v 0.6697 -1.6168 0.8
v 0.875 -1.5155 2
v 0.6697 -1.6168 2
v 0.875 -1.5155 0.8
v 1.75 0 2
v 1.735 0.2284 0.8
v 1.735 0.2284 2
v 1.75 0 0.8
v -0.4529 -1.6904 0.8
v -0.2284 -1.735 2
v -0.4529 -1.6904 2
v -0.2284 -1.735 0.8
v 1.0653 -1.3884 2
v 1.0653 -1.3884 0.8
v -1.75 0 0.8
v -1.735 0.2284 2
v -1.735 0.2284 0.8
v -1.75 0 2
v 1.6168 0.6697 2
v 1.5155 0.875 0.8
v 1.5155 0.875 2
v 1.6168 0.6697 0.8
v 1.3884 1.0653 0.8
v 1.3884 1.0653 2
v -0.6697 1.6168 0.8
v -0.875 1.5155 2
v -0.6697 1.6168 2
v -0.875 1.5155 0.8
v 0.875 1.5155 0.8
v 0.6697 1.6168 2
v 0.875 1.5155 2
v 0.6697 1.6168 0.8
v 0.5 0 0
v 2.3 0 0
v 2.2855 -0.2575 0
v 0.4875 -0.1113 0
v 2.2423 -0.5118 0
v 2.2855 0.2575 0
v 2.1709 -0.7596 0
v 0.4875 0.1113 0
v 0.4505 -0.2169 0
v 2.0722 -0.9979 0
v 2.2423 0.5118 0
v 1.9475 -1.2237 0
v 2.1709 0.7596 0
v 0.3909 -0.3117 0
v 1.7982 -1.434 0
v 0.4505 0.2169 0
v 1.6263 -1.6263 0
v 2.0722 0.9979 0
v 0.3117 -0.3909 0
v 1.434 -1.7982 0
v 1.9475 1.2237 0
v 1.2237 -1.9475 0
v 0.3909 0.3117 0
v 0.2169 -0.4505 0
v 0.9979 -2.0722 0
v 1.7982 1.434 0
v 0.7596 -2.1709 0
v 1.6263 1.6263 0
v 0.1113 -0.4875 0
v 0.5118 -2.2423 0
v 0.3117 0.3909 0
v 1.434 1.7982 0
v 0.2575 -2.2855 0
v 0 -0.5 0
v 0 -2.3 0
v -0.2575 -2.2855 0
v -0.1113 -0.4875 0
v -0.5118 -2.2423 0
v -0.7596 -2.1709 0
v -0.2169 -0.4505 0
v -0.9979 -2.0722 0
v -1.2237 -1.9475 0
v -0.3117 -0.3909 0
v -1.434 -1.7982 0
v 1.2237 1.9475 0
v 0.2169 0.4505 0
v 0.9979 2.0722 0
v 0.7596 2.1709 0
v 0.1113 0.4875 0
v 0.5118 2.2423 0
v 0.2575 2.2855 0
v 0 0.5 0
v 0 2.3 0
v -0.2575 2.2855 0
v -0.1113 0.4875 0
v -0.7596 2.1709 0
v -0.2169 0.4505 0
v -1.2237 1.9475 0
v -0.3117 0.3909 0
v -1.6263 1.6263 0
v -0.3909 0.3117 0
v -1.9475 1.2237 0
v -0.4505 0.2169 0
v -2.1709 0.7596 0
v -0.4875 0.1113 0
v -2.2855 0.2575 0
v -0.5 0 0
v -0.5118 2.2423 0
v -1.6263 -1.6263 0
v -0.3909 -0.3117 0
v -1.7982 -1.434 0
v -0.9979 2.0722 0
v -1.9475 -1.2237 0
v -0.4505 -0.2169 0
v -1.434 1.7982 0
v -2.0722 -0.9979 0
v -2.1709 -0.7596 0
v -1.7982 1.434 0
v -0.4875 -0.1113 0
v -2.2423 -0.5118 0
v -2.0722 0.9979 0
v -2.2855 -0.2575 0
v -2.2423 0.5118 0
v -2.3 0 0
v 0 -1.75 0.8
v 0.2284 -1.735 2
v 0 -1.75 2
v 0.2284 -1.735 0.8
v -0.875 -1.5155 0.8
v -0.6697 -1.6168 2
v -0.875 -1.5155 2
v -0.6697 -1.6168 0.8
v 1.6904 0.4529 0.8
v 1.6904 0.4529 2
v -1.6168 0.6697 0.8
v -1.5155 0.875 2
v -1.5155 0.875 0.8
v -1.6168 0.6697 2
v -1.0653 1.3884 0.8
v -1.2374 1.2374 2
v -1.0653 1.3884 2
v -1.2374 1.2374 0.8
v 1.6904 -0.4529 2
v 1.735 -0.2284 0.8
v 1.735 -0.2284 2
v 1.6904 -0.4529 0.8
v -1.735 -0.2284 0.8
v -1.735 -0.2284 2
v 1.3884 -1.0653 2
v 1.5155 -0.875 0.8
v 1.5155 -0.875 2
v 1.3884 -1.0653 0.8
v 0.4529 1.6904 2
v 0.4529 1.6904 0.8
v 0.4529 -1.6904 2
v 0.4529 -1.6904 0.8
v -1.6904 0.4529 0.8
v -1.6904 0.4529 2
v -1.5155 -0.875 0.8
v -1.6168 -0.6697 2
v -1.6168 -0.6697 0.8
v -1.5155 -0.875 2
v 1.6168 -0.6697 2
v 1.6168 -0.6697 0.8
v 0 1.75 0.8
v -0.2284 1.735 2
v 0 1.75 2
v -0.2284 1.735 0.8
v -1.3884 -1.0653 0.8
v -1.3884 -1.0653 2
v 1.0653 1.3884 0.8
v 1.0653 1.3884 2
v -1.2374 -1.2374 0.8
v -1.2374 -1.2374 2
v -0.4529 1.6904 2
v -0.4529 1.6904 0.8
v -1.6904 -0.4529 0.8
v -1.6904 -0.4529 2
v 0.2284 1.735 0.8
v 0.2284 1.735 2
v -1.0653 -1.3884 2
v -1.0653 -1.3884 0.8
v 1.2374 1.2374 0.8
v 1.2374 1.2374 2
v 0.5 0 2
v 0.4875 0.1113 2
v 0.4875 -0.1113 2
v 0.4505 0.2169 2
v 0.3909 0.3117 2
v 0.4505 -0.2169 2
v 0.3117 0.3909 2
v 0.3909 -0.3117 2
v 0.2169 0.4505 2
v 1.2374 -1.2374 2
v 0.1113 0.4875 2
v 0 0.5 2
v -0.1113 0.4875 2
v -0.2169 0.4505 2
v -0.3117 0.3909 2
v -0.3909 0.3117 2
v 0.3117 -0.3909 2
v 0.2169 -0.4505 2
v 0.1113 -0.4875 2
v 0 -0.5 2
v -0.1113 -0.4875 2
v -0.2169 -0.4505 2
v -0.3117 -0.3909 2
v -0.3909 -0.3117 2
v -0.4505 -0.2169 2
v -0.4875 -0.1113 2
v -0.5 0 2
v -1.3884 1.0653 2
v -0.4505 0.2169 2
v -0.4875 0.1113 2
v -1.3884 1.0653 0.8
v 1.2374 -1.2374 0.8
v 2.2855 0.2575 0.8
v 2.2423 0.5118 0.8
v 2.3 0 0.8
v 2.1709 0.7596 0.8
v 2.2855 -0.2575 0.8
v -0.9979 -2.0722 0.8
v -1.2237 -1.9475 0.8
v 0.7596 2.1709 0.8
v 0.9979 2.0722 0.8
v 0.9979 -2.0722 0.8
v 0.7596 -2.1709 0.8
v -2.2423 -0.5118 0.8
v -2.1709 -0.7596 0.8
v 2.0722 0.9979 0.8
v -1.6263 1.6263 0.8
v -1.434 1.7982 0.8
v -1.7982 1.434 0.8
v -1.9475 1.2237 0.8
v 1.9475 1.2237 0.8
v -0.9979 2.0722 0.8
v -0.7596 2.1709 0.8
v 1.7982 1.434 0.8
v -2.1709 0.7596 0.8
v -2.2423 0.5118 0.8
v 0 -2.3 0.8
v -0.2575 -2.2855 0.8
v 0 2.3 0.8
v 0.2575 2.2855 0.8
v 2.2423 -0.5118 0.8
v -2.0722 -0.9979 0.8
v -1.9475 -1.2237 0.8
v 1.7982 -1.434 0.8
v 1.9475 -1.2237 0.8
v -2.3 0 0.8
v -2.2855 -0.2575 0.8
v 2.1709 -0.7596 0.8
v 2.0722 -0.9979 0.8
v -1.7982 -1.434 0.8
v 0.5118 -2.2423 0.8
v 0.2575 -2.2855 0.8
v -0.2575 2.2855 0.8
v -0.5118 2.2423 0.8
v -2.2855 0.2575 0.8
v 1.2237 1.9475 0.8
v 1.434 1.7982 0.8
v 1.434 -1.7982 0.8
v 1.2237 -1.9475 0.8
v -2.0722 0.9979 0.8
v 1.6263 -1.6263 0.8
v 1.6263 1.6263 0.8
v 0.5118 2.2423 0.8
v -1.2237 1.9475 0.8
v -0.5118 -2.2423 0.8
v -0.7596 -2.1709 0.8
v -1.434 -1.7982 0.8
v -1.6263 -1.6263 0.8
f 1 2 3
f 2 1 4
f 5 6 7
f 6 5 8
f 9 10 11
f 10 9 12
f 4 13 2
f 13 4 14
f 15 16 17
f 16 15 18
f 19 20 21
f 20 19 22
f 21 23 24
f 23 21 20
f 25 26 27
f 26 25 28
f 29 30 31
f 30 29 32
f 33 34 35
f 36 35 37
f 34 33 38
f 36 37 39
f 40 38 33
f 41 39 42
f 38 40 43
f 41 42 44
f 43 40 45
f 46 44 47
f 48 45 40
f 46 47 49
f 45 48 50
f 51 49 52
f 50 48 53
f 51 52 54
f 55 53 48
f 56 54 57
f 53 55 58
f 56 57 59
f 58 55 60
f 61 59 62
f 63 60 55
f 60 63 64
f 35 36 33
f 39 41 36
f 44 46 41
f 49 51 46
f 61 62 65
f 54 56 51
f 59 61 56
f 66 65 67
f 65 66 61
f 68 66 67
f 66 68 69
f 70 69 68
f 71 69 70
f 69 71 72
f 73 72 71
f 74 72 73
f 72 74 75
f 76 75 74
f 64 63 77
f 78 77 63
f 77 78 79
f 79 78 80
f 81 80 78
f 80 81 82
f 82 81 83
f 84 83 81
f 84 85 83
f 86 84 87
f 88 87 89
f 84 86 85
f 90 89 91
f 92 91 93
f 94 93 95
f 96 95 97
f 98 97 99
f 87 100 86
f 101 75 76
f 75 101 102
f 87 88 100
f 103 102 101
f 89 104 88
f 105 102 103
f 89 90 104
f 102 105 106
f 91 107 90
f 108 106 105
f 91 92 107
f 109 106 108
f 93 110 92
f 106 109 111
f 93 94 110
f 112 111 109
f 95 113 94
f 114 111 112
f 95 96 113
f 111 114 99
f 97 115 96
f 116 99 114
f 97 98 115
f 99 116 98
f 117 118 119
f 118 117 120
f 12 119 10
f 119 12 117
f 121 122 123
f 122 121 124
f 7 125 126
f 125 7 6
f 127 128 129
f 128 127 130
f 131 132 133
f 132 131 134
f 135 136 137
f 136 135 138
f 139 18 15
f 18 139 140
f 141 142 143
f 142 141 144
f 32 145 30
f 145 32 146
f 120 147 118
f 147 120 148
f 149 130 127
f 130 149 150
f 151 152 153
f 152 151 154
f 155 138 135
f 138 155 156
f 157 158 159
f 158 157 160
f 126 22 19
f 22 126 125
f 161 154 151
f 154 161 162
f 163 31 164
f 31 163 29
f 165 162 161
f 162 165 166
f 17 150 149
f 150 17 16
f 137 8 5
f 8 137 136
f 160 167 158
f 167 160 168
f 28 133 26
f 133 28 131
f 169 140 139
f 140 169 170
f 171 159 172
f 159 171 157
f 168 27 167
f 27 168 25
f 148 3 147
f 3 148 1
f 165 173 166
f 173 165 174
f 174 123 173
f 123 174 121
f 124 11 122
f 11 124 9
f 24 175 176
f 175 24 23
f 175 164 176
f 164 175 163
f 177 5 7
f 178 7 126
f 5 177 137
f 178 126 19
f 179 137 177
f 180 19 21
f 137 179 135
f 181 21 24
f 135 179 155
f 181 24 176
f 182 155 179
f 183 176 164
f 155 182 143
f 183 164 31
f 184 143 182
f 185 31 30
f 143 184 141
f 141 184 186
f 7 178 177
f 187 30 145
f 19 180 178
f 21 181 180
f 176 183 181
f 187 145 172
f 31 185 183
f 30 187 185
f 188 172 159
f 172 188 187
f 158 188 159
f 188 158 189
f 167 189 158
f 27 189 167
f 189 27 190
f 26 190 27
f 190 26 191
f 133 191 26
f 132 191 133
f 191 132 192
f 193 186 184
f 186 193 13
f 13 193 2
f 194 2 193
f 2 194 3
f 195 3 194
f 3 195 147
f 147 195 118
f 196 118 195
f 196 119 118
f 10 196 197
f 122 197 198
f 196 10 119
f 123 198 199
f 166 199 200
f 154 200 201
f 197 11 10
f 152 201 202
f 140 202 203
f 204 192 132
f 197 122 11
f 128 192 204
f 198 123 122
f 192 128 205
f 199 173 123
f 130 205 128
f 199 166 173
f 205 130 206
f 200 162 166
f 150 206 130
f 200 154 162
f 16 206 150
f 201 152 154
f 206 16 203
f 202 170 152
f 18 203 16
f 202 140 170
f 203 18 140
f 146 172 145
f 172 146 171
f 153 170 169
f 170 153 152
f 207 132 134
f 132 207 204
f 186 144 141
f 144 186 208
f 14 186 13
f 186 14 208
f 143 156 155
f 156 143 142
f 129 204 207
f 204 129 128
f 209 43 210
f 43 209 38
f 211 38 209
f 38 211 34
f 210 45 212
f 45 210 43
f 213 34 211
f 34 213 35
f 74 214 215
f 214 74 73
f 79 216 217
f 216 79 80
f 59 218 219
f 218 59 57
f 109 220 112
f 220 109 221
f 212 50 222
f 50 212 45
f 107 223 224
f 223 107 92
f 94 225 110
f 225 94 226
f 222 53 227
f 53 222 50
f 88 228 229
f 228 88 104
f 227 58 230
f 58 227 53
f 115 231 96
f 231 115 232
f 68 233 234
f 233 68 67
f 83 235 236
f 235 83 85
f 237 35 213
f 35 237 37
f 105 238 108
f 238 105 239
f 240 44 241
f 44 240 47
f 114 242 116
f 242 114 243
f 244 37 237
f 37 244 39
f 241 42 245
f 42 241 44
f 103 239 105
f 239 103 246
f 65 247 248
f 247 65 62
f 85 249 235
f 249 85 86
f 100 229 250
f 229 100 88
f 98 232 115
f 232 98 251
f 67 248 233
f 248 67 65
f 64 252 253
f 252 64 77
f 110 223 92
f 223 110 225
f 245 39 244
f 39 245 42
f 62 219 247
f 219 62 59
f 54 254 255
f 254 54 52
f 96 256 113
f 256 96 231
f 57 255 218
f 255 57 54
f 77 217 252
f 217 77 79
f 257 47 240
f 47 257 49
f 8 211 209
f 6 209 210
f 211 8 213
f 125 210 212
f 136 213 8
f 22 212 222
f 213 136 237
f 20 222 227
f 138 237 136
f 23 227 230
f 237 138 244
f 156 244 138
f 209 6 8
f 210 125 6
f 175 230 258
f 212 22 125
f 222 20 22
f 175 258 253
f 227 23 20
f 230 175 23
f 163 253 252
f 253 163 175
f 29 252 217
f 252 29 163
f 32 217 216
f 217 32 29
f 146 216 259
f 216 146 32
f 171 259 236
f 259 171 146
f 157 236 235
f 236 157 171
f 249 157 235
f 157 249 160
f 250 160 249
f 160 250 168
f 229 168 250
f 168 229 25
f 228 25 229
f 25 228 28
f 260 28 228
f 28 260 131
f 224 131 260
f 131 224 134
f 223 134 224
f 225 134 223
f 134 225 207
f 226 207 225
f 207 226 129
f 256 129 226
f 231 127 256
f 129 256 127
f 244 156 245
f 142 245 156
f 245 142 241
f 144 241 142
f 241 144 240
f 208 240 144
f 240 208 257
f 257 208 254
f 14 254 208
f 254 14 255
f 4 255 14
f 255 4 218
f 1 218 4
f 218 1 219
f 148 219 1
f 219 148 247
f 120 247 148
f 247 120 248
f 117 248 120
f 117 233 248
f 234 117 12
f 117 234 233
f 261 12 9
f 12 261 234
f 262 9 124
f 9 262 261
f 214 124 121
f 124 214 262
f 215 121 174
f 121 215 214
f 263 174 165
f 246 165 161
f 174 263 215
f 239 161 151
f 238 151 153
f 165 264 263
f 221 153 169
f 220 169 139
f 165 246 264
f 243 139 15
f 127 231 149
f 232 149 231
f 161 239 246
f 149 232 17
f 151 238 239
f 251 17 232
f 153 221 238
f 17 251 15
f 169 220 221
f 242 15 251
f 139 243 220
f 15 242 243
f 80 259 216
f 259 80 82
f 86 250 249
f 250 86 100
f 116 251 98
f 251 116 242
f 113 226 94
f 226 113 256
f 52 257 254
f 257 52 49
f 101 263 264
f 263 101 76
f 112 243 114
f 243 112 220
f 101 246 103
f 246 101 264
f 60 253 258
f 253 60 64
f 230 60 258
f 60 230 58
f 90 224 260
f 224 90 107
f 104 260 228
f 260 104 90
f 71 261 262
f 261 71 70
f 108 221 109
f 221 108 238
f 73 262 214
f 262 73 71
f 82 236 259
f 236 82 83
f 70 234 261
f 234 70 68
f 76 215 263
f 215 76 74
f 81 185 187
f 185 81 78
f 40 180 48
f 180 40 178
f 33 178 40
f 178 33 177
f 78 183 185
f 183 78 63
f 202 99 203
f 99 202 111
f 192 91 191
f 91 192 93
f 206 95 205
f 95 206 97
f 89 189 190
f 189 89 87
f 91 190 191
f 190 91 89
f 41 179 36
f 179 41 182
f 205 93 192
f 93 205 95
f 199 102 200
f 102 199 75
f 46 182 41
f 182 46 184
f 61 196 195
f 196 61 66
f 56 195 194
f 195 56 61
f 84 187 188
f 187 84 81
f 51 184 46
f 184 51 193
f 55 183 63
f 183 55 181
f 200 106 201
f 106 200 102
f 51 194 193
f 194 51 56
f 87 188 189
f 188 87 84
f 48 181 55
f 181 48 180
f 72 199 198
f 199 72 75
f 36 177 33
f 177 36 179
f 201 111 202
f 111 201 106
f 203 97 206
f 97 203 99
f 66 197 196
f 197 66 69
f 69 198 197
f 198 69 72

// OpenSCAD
// part_id: cp7
// name: Large bush
// source_drawing_ids: DRW-005
// units: mm
// revision: 0.1
// SPDX-License-Identifier: MIT

module part_cp7(od = 3.5, id = 1.0, th = 2.0, lip_d = 4.6, lip_th = 0.8) {
    difference() {
        union() {
            cylinder(d = od, h = th, center = false, $fn = 48);
            cylinder(d = lip_d, h = lip_th, center = false, $fn = 56);
        }
        translate([0, 0, -0.1]) cylinder(d = id, h = th + 0.2, center = false, $fn = 28);
    }
}

// ---- "main guard" ----
// Default to previewing when opened directly:
if (is_undef(__LIB_MODE__)) {
    part_cp7();
}
